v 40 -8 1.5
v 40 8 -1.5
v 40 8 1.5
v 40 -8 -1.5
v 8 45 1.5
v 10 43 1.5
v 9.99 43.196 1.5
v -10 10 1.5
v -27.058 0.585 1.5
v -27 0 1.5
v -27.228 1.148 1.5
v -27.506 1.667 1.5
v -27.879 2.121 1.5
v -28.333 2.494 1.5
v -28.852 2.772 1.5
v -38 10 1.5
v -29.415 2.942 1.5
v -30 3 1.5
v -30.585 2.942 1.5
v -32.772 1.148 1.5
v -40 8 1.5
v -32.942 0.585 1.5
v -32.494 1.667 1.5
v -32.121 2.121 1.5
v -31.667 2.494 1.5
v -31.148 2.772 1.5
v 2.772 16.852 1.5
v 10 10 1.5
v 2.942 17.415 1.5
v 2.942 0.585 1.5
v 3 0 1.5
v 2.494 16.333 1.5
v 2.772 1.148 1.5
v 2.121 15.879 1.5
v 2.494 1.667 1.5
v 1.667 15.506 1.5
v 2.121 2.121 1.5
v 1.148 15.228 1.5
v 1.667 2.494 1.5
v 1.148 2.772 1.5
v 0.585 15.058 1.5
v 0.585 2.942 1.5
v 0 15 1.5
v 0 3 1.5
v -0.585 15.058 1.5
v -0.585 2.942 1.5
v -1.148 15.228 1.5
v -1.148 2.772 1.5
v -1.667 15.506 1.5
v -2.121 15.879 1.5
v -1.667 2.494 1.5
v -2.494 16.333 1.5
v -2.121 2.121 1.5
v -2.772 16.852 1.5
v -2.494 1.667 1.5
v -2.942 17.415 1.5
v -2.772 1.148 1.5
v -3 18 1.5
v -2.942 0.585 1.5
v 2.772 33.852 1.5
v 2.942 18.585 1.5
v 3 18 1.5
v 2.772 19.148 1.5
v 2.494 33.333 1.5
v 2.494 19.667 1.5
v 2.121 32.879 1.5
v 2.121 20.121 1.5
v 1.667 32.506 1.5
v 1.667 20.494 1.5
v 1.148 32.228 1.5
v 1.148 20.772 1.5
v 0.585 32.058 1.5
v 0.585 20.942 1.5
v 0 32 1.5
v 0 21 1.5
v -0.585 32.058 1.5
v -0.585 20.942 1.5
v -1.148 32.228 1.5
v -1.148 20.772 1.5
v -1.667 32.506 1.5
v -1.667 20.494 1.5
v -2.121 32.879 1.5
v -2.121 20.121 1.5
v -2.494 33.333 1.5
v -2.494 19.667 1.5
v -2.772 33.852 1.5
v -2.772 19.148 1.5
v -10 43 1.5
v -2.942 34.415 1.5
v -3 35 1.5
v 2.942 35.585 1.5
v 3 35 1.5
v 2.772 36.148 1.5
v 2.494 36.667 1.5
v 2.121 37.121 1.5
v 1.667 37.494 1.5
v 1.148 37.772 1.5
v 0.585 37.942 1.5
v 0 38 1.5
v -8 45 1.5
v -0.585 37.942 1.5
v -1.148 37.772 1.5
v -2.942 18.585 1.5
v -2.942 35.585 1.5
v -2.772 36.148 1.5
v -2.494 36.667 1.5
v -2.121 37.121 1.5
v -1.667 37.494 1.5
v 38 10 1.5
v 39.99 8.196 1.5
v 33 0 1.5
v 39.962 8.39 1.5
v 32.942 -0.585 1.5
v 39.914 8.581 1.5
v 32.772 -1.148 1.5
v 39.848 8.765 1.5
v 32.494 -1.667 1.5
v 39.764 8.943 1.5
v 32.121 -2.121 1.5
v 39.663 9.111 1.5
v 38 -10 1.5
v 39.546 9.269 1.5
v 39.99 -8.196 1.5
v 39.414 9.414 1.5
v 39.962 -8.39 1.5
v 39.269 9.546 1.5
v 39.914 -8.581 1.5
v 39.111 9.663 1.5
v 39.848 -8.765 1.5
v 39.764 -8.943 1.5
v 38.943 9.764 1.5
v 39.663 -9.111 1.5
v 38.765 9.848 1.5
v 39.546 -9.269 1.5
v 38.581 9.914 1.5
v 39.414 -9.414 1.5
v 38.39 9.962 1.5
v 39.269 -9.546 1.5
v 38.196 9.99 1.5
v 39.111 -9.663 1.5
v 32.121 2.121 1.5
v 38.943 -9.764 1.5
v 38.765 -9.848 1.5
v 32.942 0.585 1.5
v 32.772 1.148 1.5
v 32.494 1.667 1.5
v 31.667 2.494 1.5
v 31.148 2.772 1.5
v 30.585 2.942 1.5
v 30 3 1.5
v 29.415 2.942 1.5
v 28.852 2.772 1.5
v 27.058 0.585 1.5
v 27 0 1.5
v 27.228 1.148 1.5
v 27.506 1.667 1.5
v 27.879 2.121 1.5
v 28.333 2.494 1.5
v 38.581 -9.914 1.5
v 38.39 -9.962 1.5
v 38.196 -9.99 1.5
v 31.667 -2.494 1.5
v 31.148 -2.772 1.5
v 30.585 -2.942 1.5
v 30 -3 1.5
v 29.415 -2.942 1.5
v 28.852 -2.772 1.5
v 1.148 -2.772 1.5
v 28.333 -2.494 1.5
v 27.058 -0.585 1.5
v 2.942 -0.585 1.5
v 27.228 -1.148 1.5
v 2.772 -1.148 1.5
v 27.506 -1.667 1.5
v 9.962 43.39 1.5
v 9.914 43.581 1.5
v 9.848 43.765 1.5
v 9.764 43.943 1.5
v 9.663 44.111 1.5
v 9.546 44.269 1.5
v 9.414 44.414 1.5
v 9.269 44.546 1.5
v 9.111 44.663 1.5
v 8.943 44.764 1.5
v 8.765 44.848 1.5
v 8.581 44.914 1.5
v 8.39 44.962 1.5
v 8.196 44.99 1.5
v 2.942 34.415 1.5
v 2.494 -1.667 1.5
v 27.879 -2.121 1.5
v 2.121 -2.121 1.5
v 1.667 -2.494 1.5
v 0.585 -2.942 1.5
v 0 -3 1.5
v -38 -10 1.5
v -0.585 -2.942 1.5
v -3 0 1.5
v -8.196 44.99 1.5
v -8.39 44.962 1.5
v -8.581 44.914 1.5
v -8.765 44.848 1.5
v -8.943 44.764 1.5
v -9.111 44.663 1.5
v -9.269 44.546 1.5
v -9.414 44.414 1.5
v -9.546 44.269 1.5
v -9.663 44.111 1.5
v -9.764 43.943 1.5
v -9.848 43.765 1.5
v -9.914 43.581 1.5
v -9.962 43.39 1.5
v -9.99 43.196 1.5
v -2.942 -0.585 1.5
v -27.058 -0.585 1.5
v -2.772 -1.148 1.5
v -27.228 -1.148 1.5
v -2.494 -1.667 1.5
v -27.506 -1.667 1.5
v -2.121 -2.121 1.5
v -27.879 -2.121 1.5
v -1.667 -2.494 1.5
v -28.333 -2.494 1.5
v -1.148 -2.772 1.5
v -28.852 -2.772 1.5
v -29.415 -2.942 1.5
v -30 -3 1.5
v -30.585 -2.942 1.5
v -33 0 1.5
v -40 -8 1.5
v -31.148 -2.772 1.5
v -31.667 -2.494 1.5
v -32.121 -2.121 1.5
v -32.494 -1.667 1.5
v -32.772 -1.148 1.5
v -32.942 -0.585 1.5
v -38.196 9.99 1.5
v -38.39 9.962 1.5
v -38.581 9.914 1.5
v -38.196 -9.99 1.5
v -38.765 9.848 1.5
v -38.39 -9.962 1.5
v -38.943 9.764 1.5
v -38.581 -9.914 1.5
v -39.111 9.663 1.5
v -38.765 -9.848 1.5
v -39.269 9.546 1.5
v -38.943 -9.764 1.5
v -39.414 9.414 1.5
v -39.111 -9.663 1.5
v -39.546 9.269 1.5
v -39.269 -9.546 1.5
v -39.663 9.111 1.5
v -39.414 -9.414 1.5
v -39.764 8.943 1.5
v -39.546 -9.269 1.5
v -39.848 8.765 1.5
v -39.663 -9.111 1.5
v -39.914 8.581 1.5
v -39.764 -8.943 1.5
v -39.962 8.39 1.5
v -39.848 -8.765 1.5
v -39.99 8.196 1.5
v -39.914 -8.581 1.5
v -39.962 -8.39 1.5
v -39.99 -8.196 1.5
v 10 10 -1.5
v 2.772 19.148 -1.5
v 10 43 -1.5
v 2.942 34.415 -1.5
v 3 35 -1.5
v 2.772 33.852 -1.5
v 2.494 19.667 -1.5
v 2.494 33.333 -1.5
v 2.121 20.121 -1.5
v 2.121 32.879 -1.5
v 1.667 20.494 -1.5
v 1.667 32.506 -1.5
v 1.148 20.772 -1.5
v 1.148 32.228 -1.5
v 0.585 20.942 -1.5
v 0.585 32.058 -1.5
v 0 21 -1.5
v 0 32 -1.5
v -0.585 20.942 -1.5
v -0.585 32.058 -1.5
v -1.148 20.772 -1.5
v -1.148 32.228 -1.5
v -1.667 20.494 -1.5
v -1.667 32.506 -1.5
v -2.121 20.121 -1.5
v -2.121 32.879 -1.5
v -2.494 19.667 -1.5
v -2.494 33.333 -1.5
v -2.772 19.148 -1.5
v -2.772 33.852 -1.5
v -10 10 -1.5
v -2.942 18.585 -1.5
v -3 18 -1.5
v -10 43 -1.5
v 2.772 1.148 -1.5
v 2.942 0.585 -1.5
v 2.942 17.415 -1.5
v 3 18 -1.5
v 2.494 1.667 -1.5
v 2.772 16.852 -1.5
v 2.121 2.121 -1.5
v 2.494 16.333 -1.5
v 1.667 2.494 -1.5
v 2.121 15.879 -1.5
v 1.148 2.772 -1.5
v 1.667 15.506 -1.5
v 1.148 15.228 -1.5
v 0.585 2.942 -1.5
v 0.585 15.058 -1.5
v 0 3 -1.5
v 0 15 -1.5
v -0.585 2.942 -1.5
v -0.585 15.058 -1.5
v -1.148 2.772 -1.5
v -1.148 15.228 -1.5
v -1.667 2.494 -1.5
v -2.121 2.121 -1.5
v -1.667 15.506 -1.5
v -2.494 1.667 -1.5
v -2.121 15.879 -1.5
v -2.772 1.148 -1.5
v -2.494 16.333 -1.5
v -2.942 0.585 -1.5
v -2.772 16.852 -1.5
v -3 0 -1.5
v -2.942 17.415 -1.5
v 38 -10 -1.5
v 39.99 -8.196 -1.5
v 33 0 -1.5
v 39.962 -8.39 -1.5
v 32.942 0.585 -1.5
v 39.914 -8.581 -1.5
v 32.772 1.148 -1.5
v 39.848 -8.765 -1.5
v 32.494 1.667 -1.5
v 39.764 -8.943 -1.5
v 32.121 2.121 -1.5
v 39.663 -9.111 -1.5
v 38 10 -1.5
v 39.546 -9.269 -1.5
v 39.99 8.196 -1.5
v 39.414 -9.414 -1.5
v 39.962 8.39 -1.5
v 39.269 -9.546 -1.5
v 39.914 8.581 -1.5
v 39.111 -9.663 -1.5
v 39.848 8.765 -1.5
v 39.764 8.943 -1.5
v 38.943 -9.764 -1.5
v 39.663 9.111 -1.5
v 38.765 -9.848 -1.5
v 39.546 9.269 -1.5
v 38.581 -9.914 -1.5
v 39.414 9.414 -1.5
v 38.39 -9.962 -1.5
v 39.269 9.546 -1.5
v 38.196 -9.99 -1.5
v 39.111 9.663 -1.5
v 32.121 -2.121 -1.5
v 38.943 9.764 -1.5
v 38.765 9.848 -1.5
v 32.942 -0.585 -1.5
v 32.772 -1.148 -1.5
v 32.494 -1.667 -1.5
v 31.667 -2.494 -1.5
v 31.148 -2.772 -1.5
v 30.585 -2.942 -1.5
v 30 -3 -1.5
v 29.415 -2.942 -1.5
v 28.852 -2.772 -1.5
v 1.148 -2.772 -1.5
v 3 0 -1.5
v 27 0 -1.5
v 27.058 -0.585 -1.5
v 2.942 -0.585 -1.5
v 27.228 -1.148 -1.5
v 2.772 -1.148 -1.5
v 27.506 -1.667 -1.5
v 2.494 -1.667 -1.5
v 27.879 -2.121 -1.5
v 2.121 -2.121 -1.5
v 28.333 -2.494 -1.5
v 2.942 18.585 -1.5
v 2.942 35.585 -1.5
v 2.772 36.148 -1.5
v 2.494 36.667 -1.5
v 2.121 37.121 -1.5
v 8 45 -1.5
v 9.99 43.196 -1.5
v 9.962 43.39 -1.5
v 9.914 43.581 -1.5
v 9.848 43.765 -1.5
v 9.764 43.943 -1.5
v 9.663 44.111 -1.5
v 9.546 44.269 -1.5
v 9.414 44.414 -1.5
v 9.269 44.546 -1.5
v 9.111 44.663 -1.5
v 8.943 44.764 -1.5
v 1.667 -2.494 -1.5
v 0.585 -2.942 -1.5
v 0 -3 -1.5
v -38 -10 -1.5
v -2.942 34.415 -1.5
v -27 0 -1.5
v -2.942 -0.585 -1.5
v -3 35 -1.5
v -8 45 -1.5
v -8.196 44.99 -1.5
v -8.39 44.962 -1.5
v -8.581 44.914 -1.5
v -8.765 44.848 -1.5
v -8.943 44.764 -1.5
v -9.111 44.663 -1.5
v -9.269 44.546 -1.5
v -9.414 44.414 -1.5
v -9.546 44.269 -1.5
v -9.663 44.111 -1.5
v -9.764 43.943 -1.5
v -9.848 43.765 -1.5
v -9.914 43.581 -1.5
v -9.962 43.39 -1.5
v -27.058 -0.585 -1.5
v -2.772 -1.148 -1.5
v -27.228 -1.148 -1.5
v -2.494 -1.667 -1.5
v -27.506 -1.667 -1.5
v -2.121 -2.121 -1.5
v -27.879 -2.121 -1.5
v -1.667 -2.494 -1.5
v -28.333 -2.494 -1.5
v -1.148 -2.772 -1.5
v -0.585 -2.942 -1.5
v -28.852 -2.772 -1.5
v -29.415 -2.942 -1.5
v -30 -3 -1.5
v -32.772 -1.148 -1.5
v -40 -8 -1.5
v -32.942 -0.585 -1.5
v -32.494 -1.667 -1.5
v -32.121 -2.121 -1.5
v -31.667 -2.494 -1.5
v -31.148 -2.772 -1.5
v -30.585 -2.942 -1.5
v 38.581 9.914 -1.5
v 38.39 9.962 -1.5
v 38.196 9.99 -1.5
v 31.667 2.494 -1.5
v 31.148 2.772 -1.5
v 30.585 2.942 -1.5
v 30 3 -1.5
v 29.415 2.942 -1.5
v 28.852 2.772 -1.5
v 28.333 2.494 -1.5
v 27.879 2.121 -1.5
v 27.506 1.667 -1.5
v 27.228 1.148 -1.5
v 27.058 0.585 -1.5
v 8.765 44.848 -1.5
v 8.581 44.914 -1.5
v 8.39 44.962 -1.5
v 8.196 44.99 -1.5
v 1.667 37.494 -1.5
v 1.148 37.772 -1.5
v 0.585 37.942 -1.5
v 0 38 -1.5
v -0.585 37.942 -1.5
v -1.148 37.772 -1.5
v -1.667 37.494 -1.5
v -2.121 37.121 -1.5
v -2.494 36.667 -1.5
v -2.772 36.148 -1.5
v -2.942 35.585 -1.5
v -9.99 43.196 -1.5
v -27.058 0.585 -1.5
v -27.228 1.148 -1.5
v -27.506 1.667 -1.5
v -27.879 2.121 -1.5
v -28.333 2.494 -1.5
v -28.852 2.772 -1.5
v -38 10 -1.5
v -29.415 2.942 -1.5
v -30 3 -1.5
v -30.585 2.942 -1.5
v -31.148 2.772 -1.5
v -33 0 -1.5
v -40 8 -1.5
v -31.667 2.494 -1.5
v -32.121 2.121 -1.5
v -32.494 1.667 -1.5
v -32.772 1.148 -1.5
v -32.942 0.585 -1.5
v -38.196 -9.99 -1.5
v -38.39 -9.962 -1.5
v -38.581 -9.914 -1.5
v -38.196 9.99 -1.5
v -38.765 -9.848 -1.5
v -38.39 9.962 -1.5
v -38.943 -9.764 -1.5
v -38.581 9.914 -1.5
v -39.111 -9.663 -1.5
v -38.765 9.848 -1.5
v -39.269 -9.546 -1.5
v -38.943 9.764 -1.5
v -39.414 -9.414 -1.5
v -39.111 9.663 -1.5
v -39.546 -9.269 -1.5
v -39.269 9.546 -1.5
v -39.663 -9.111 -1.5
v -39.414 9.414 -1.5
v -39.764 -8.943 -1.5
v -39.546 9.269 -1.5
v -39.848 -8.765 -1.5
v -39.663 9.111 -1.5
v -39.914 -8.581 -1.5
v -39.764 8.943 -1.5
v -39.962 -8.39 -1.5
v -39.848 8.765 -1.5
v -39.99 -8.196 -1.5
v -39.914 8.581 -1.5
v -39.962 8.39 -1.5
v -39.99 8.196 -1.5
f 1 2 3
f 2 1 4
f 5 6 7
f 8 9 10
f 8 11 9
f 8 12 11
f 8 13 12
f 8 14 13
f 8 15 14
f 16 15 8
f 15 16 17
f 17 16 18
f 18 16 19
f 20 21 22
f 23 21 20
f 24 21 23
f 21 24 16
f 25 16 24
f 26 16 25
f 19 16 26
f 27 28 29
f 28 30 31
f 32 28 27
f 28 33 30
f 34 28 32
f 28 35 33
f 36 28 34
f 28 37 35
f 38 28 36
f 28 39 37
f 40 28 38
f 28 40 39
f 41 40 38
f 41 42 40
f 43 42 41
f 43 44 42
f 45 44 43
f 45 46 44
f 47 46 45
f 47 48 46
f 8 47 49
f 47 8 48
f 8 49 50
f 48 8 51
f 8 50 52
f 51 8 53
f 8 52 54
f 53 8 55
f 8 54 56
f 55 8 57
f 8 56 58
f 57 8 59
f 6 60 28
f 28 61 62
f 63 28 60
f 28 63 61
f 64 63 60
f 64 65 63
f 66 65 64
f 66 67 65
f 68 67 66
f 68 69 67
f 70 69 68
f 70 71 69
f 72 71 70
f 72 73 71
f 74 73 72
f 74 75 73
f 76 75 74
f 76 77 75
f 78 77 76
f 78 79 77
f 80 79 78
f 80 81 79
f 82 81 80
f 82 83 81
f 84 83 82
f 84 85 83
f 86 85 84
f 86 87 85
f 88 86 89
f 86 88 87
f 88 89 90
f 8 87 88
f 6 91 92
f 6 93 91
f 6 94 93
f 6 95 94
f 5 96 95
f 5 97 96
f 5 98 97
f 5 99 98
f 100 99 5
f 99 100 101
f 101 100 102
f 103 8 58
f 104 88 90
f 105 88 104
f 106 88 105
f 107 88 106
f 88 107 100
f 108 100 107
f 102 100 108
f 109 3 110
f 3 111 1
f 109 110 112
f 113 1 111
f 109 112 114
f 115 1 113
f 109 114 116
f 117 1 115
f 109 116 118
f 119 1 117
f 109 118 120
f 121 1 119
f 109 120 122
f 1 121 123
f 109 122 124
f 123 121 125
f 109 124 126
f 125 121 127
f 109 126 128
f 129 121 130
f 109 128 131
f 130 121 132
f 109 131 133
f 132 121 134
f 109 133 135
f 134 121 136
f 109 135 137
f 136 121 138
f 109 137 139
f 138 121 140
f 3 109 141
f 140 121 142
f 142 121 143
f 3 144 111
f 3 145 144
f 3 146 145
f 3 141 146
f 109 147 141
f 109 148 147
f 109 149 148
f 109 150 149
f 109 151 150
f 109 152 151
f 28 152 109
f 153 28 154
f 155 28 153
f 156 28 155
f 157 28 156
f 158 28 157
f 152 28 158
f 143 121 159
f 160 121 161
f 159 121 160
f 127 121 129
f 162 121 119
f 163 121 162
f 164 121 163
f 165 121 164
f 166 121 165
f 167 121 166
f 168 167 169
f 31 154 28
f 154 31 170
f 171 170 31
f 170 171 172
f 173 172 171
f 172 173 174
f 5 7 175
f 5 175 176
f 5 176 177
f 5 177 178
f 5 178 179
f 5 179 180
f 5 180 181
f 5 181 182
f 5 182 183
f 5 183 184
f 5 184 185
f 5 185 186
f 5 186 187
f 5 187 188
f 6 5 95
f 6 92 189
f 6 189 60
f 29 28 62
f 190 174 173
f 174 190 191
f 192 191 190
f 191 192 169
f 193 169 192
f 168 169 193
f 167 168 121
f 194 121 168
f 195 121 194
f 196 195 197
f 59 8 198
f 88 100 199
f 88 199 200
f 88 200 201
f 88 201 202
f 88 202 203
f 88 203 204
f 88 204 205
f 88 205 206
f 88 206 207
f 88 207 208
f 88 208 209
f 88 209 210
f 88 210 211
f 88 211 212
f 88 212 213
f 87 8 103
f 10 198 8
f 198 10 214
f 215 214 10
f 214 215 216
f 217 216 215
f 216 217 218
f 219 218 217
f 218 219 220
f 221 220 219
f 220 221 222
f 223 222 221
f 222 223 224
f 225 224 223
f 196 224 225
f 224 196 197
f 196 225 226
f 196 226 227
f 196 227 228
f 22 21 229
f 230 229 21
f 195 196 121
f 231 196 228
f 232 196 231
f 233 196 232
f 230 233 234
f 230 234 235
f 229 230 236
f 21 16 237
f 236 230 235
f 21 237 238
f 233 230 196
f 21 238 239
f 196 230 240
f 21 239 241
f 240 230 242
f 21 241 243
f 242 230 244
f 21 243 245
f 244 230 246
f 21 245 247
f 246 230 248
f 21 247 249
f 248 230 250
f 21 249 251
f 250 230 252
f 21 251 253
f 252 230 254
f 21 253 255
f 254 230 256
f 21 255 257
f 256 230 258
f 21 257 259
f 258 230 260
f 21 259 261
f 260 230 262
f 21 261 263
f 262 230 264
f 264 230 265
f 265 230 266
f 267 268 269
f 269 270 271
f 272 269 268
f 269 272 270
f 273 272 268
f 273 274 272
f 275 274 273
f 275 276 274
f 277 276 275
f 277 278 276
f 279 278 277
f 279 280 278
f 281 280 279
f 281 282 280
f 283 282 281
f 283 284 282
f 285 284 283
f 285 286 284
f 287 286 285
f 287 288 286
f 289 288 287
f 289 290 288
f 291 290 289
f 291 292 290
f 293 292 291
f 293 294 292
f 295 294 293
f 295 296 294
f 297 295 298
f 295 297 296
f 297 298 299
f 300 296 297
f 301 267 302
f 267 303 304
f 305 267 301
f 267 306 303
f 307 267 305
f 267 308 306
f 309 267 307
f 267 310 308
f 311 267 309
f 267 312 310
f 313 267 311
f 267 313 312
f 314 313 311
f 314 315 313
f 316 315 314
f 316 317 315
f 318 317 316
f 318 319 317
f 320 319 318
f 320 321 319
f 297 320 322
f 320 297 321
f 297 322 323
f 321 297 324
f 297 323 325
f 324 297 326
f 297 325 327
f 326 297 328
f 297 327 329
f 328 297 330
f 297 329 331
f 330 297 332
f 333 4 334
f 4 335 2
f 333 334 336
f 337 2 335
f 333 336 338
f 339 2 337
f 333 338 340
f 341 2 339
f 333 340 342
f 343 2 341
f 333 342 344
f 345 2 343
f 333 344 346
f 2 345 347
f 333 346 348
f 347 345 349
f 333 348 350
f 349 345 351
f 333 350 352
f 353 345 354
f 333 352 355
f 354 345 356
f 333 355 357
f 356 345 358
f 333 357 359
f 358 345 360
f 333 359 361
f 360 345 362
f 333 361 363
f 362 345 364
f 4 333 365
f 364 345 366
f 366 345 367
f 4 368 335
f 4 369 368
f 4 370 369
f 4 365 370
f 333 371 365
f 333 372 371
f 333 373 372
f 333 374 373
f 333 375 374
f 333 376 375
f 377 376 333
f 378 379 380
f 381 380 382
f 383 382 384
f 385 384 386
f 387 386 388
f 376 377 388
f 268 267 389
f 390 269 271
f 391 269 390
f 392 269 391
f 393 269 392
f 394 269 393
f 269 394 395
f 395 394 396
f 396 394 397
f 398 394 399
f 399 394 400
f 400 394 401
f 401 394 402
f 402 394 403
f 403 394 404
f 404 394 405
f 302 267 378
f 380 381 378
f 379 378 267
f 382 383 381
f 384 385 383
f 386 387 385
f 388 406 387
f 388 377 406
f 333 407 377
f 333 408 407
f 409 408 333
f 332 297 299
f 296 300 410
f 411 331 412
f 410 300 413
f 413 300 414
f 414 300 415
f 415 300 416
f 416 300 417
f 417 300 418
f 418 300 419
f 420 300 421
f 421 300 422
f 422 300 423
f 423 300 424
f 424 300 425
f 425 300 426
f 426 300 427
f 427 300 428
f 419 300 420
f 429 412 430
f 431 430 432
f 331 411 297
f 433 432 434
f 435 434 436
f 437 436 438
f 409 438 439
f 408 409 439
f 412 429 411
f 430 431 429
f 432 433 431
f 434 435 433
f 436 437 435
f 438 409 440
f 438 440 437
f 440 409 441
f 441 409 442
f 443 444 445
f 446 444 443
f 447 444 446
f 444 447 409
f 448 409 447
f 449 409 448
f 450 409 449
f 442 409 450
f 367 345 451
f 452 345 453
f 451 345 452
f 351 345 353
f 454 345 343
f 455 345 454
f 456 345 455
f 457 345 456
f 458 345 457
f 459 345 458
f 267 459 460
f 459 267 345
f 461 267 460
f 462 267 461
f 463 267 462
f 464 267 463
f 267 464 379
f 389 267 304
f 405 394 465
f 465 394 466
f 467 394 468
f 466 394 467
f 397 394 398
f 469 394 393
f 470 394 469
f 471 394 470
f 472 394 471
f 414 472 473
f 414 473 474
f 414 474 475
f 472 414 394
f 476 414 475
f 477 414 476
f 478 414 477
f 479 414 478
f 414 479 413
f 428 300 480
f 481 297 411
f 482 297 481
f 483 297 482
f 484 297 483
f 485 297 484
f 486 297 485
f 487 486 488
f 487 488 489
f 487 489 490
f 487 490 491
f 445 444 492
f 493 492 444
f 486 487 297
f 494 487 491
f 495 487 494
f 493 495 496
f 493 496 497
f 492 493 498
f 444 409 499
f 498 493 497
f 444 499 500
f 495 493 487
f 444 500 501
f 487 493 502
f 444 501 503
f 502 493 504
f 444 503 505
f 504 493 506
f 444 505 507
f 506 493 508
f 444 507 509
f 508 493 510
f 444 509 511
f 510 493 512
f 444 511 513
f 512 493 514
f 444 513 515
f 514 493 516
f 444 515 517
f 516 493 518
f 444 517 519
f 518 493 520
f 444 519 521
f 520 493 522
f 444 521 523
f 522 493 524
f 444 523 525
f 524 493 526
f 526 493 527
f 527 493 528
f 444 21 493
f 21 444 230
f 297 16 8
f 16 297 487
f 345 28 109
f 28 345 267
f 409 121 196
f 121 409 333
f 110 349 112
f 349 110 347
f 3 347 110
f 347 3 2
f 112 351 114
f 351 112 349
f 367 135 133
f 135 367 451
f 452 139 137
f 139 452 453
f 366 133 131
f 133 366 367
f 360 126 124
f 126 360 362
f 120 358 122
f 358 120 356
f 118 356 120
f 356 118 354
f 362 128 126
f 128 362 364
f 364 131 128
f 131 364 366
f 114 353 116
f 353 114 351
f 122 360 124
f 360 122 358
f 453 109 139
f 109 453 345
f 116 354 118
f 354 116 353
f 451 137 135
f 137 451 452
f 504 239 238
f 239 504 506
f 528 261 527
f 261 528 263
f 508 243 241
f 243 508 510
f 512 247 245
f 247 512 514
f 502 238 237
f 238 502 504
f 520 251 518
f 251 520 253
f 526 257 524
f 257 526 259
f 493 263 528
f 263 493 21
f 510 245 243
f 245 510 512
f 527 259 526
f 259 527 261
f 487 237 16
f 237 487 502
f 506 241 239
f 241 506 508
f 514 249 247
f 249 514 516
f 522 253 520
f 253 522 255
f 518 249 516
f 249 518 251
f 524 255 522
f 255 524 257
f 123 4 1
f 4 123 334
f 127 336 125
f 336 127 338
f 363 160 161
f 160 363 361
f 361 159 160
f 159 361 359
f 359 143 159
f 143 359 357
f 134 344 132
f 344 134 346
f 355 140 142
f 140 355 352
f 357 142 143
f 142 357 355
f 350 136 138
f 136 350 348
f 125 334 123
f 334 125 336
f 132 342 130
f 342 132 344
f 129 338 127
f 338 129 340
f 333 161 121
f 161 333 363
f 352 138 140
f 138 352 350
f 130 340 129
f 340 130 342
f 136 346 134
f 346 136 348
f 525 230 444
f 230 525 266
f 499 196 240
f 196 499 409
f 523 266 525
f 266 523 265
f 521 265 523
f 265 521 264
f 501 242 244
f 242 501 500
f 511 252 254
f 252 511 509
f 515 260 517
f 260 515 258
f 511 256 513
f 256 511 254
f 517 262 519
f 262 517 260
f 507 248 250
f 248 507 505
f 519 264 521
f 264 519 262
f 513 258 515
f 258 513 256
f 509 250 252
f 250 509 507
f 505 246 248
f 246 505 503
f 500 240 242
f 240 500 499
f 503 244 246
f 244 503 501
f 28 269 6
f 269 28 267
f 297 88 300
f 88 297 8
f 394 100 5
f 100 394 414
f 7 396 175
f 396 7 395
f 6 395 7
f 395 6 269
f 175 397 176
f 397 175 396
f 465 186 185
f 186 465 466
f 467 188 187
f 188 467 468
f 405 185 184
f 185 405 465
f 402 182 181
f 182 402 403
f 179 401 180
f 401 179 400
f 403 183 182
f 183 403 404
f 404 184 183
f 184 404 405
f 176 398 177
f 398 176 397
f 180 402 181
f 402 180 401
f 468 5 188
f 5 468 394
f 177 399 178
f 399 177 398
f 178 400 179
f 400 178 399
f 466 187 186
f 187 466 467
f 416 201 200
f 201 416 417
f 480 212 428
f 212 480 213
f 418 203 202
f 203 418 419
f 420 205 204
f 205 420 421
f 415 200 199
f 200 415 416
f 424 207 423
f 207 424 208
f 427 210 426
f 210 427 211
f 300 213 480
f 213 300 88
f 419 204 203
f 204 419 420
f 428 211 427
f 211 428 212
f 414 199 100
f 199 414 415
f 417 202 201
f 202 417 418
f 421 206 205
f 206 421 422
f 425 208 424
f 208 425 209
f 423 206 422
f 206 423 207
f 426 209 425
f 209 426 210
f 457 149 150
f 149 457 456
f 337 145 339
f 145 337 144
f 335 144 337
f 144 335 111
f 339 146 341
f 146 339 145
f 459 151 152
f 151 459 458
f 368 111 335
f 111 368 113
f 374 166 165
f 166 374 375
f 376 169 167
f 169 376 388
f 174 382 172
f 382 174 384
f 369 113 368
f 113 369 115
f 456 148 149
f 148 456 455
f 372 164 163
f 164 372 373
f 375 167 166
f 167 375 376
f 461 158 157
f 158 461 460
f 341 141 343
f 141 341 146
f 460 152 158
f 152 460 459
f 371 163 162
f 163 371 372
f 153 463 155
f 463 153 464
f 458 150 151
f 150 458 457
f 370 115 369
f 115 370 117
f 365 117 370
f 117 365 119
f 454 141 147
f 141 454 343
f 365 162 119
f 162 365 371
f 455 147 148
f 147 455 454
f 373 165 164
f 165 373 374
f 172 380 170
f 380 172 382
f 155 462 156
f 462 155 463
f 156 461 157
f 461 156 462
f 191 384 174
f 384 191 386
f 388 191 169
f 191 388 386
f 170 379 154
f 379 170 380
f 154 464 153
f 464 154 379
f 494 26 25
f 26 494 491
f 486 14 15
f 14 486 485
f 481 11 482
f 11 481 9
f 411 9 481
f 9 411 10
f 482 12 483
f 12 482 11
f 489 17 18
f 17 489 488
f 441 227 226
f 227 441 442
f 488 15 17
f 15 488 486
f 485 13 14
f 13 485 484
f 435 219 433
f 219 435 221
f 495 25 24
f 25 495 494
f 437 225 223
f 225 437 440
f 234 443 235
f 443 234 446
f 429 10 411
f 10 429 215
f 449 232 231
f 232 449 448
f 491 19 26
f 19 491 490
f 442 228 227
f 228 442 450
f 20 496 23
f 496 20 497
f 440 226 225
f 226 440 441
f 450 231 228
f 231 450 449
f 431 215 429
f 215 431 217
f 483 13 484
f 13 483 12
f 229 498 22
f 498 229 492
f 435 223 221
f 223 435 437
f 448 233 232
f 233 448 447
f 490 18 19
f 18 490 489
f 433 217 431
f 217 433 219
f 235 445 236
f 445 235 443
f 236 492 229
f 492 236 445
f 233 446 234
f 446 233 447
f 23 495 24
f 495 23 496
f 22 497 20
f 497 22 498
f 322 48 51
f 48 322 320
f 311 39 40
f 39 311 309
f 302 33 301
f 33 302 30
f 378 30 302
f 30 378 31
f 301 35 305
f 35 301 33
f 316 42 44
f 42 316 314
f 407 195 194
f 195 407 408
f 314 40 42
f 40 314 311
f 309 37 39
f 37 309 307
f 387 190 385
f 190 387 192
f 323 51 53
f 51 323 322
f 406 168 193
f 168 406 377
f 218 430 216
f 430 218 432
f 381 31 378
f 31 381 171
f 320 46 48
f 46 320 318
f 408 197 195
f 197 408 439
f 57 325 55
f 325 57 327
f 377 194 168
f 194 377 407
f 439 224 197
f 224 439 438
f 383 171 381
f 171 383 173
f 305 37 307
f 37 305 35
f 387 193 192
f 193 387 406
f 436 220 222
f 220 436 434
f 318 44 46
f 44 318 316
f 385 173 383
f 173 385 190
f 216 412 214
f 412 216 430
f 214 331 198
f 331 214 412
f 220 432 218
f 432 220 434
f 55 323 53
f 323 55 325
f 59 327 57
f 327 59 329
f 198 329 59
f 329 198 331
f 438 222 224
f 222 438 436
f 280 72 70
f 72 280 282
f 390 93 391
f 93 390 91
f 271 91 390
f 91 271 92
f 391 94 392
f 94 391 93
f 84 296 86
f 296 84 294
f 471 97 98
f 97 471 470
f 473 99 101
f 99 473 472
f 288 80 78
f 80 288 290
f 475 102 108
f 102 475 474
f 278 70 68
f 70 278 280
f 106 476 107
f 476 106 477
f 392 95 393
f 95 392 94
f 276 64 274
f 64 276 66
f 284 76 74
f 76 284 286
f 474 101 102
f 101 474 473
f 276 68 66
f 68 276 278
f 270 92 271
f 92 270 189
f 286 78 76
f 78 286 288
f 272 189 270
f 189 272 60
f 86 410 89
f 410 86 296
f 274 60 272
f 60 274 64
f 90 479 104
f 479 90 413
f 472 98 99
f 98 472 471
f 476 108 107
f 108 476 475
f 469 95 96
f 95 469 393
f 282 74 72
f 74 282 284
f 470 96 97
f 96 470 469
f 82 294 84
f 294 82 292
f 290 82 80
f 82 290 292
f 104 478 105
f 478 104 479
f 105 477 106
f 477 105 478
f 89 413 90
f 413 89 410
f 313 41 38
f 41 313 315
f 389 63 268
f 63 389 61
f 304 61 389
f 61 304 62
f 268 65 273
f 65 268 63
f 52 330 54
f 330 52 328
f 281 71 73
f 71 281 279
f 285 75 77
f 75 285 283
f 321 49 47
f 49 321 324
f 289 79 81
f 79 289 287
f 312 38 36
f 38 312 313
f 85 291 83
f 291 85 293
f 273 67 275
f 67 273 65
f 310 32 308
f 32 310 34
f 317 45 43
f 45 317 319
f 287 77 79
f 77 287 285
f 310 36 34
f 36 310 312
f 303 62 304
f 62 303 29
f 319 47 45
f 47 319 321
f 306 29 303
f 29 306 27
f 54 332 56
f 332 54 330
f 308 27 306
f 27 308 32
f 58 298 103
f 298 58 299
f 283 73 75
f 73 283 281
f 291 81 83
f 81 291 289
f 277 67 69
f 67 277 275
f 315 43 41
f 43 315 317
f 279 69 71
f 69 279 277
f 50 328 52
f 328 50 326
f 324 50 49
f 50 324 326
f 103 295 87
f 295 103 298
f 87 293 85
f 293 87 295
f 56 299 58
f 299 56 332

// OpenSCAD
difference()
{
    union()
    {
        rounded_box(80,20,3,2,$fn=64);
        
        translate([0,20,0])
        rounded_box(20,50,3,2,$fn=64);
    }
    
    translate([30,0,0])
    cylinder(d=6,h=7,$fn=32,center=true);
    
    translate([-30,0,0])
    cylinder(d=6,h=7,$fn=32,center=true);
    
    translate([0,0,0])
    cylinder(d=6,h=7,$fn=32,center=true);
    
    translate([0,35,0])
    cylinder(d=6,h=7,$fn=32,center=true);
    
    translate([0,18,0])
    cylinder(d=6,h=7,$fn=32,center=true);
}

module rounded_box(x,y,z,radius,$fn=$fn)
{
    union()
    {
        cube([x,y-2*radius,z],center=true);
        cube([x-2*radius,y,z],center=true);
        
        translate([(x/2-radius),(y/2-radius),0])
        cylinder(r=radius,h=z,center=true);
        
        translate([-(x/2-radius),(y/2-radius),0])
        cylinder(r=radius,h=z,center=true);
        
        translate([(x/2-radius),-(y/2-radius),0])
        cylinder(r=radius,h=z,center=true);
        
        translate([-(x/2-radius),-(y/2-radius),0])
        cylinder(r=radius,h=z,center=true);
    }
}
